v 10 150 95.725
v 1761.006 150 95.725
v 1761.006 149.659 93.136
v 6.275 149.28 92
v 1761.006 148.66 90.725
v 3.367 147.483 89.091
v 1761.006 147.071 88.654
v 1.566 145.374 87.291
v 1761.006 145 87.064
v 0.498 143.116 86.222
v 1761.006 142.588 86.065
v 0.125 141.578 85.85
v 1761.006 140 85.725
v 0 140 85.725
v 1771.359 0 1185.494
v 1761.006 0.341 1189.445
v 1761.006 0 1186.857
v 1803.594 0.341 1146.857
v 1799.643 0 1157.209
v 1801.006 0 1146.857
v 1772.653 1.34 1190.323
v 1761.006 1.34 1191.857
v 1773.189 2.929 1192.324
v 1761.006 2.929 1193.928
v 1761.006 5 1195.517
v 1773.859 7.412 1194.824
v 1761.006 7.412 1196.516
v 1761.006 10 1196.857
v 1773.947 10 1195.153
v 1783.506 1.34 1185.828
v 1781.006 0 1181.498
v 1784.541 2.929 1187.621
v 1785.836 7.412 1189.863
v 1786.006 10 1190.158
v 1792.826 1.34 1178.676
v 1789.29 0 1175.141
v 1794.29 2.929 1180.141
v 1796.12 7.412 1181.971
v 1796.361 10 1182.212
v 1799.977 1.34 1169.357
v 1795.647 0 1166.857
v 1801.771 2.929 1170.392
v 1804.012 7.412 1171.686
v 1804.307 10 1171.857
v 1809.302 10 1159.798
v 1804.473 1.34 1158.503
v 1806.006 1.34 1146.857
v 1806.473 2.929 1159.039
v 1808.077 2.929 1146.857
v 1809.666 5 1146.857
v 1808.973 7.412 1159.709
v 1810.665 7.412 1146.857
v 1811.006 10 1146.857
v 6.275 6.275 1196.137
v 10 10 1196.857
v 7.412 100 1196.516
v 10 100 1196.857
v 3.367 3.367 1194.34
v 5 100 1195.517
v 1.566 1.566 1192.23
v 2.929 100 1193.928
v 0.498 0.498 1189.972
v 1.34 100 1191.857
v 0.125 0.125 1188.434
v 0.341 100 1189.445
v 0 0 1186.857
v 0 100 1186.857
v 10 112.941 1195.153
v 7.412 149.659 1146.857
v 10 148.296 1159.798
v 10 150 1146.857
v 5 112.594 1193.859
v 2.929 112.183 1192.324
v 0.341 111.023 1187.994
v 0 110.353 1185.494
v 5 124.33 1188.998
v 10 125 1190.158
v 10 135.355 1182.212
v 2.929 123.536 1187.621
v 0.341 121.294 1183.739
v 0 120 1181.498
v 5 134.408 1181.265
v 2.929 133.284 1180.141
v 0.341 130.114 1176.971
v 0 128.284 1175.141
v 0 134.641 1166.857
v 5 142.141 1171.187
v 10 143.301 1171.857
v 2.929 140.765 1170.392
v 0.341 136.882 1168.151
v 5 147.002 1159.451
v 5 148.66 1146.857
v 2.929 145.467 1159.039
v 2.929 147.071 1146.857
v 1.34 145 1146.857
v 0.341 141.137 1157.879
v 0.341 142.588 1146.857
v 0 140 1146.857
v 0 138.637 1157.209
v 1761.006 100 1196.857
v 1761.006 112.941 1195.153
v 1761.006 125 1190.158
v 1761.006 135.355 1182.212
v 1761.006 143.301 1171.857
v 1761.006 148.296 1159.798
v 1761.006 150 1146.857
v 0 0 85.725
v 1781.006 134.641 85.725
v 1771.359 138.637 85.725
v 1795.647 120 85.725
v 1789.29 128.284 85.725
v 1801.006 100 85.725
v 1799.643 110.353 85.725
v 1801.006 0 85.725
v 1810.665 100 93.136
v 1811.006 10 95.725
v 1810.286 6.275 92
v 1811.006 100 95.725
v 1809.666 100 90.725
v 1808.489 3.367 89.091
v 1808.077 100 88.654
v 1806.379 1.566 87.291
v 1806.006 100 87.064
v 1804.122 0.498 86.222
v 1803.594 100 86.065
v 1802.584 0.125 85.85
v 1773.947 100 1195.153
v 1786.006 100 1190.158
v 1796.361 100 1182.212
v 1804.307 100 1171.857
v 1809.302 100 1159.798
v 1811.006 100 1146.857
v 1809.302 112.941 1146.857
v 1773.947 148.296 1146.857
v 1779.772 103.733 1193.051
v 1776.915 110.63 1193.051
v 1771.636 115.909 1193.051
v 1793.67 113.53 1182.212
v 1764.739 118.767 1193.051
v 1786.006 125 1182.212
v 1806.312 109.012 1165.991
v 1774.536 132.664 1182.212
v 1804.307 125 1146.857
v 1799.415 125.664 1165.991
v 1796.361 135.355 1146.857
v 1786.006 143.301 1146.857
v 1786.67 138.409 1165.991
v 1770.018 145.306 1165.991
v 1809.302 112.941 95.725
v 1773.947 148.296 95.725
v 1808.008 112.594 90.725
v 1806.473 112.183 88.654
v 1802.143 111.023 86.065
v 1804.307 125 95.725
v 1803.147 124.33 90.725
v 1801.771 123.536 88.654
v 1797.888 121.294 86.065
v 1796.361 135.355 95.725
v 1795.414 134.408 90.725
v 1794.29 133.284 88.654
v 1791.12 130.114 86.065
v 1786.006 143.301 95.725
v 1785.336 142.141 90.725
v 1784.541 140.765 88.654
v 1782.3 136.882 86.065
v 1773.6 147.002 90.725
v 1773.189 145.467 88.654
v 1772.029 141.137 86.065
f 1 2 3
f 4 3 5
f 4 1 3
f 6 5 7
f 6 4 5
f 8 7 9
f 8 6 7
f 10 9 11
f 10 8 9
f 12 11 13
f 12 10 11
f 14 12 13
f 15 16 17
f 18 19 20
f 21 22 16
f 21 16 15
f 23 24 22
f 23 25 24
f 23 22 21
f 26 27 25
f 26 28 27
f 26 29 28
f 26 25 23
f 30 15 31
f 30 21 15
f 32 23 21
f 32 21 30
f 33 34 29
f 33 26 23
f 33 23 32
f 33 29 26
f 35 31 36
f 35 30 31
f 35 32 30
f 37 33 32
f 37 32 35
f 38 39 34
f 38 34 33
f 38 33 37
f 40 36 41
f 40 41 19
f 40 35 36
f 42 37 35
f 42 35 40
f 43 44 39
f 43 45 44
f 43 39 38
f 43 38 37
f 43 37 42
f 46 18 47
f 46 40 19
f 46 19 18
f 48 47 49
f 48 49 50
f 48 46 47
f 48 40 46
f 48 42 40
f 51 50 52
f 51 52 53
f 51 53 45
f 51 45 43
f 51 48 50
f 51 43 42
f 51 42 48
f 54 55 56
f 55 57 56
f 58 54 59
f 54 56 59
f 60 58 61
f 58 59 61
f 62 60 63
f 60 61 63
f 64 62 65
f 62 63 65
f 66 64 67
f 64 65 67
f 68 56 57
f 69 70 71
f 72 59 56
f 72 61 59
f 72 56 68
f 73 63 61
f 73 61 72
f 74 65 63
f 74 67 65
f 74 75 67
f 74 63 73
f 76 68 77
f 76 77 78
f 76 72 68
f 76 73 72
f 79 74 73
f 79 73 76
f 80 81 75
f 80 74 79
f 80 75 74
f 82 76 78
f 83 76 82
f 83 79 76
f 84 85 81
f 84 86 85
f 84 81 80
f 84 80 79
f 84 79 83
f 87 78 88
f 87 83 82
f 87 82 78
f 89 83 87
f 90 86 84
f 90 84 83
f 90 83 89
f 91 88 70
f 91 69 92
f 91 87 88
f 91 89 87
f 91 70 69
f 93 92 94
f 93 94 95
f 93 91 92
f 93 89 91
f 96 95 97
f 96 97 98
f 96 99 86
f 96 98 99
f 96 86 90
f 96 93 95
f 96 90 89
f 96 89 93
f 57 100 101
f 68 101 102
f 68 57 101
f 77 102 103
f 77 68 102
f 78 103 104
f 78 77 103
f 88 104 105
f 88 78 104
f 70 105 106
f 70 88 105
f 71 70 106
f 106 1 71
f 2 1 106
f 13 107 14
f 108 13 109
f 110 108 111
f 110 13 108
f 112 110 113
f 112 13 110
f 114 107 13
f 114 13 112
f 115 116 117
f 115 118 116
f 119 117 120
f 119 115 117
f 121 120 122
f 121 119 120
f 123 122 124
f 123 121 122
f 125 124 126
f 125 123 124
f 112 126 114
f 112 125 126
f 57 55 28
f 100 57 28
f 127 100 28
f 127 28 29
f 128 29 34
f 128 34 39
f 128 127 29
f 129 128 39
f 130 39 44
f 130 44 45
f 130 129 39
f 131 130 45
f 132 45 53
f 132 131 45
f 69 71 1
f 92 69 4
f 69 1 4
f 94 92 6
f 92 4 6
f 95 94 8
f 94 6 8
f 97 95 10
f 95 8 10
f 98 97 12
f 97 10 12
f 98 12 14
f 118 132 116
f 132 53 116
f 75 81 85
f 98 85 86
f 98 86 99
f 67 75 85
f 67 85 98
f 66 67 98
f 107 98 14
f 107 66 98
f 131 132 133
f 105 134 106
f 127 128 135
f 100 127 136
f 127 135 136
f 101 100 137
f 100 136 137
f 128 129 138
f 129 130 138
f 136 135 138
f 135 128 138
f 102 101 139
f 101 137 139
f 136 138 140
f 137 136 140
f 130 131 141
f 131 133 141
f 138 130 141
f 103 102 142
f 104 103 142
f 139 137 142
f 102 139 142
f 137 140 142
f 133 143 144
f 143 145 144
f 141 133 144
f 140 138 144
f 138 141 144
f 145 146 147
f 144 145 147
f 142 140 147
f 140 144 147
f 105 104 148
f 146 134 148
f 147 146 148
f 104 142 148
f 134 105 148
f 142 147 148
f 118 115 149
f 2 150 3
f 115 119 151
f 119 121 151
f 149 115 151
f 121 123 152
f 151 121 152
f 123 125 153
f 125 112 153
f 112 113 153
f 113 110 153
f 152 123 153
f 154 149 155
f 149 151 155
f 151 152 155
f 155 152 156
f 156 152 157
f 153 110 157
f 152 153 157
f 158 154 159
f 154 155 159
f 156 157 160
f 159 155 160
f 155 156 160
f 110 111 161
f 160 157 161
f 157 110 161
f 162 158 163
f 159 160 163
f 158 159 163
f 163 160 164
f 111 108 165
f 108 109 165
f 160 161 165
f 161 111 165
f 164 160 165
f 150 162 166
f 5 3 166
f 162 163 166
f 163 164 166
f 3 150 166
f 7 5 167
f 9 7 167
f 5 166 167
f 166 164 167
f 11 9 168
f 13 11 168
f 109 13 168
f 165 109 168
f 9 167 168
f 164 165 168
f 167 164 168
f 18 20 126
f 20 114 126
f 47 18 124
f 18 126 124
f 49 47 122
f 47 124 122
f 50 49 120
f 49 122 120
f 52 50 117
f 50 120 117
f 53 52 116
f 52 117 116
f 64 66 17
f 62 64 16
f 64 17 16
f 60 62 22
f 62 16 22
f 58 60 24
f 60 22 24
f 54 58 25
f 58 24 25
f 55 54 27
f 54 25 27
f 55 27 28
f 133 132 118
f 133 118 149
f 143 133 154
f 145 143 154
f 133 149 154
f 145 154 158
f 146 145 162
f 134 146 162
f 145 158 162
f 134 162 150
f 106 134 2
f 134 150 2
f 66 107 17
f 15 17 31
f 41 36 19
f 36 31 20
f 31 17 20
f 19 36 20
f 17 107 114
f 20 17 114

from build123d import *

# Parameters (mm, degrees)
SKETCH2_W           = 1811.005901602
SKETCH2_H           = 1111.13195988
BOSS_EXTRUDE1_DEPTH = 150
FILLET1_R           = 50
FILLET2_R           = 50
FILLET3_R           = 10


with BuildPart() as part:
    # Sketch2 → Boss-Extrude1 (new body)
    with BuildSketch(Plane(origin=(0, 0, 0), x_dir=(1, 0, 0), z_dir=(0, 1, 0))):
        with Locations((905.502950801, -641.290581232)):
            Rectangle(SKETCH2_W, SKETCH2_H)
    extrude(amount=BOSS_EXTRUDE1_DEPTH)

    # Fillet1
    fillet1_edges = [part.edges().sort_by_distance(p)[0] for p in [
        (1811.005901602, 150, 641.290581232),
    ]]
    fillet(fillet1_edges, radius=FILLET1_R)

    # Fillet2
    fillet2_edges = [part.edges().sort_by_distance(p)[0] for p in [
        (1811.005901602, 50, 1196.856561172),
        (1796.361240661, 135.355339059, 1196.856561172),
        (880.502950801, 150, 1196.856561172),
    ]]
    fillet(fillet2_edges, radius=FILLET2_R)

    # Fillet3
    fillet3_edges = [part.edges().sort_by_distance(p)[0] for p in [
        (1811.005901602, 50, 85.724601292),
        (880.502950801, 150, 85.724601292),
        (1796.361240661, 135.355339059, 85.724601292),
        (0, 50, 1196.856561172),
        (1811.005901602, 0, 616.290581232),
        (1796.361240661, 0, 1182.211900231),
        (0, 135.355339059, 1182.211900231),
        (0, 150, 616.290581232),
        (880.502950801, 0, 1196.856561172),
    ]]
    fillet(fillet3_edges, radius=FILLET3_R)


solid = part.part
